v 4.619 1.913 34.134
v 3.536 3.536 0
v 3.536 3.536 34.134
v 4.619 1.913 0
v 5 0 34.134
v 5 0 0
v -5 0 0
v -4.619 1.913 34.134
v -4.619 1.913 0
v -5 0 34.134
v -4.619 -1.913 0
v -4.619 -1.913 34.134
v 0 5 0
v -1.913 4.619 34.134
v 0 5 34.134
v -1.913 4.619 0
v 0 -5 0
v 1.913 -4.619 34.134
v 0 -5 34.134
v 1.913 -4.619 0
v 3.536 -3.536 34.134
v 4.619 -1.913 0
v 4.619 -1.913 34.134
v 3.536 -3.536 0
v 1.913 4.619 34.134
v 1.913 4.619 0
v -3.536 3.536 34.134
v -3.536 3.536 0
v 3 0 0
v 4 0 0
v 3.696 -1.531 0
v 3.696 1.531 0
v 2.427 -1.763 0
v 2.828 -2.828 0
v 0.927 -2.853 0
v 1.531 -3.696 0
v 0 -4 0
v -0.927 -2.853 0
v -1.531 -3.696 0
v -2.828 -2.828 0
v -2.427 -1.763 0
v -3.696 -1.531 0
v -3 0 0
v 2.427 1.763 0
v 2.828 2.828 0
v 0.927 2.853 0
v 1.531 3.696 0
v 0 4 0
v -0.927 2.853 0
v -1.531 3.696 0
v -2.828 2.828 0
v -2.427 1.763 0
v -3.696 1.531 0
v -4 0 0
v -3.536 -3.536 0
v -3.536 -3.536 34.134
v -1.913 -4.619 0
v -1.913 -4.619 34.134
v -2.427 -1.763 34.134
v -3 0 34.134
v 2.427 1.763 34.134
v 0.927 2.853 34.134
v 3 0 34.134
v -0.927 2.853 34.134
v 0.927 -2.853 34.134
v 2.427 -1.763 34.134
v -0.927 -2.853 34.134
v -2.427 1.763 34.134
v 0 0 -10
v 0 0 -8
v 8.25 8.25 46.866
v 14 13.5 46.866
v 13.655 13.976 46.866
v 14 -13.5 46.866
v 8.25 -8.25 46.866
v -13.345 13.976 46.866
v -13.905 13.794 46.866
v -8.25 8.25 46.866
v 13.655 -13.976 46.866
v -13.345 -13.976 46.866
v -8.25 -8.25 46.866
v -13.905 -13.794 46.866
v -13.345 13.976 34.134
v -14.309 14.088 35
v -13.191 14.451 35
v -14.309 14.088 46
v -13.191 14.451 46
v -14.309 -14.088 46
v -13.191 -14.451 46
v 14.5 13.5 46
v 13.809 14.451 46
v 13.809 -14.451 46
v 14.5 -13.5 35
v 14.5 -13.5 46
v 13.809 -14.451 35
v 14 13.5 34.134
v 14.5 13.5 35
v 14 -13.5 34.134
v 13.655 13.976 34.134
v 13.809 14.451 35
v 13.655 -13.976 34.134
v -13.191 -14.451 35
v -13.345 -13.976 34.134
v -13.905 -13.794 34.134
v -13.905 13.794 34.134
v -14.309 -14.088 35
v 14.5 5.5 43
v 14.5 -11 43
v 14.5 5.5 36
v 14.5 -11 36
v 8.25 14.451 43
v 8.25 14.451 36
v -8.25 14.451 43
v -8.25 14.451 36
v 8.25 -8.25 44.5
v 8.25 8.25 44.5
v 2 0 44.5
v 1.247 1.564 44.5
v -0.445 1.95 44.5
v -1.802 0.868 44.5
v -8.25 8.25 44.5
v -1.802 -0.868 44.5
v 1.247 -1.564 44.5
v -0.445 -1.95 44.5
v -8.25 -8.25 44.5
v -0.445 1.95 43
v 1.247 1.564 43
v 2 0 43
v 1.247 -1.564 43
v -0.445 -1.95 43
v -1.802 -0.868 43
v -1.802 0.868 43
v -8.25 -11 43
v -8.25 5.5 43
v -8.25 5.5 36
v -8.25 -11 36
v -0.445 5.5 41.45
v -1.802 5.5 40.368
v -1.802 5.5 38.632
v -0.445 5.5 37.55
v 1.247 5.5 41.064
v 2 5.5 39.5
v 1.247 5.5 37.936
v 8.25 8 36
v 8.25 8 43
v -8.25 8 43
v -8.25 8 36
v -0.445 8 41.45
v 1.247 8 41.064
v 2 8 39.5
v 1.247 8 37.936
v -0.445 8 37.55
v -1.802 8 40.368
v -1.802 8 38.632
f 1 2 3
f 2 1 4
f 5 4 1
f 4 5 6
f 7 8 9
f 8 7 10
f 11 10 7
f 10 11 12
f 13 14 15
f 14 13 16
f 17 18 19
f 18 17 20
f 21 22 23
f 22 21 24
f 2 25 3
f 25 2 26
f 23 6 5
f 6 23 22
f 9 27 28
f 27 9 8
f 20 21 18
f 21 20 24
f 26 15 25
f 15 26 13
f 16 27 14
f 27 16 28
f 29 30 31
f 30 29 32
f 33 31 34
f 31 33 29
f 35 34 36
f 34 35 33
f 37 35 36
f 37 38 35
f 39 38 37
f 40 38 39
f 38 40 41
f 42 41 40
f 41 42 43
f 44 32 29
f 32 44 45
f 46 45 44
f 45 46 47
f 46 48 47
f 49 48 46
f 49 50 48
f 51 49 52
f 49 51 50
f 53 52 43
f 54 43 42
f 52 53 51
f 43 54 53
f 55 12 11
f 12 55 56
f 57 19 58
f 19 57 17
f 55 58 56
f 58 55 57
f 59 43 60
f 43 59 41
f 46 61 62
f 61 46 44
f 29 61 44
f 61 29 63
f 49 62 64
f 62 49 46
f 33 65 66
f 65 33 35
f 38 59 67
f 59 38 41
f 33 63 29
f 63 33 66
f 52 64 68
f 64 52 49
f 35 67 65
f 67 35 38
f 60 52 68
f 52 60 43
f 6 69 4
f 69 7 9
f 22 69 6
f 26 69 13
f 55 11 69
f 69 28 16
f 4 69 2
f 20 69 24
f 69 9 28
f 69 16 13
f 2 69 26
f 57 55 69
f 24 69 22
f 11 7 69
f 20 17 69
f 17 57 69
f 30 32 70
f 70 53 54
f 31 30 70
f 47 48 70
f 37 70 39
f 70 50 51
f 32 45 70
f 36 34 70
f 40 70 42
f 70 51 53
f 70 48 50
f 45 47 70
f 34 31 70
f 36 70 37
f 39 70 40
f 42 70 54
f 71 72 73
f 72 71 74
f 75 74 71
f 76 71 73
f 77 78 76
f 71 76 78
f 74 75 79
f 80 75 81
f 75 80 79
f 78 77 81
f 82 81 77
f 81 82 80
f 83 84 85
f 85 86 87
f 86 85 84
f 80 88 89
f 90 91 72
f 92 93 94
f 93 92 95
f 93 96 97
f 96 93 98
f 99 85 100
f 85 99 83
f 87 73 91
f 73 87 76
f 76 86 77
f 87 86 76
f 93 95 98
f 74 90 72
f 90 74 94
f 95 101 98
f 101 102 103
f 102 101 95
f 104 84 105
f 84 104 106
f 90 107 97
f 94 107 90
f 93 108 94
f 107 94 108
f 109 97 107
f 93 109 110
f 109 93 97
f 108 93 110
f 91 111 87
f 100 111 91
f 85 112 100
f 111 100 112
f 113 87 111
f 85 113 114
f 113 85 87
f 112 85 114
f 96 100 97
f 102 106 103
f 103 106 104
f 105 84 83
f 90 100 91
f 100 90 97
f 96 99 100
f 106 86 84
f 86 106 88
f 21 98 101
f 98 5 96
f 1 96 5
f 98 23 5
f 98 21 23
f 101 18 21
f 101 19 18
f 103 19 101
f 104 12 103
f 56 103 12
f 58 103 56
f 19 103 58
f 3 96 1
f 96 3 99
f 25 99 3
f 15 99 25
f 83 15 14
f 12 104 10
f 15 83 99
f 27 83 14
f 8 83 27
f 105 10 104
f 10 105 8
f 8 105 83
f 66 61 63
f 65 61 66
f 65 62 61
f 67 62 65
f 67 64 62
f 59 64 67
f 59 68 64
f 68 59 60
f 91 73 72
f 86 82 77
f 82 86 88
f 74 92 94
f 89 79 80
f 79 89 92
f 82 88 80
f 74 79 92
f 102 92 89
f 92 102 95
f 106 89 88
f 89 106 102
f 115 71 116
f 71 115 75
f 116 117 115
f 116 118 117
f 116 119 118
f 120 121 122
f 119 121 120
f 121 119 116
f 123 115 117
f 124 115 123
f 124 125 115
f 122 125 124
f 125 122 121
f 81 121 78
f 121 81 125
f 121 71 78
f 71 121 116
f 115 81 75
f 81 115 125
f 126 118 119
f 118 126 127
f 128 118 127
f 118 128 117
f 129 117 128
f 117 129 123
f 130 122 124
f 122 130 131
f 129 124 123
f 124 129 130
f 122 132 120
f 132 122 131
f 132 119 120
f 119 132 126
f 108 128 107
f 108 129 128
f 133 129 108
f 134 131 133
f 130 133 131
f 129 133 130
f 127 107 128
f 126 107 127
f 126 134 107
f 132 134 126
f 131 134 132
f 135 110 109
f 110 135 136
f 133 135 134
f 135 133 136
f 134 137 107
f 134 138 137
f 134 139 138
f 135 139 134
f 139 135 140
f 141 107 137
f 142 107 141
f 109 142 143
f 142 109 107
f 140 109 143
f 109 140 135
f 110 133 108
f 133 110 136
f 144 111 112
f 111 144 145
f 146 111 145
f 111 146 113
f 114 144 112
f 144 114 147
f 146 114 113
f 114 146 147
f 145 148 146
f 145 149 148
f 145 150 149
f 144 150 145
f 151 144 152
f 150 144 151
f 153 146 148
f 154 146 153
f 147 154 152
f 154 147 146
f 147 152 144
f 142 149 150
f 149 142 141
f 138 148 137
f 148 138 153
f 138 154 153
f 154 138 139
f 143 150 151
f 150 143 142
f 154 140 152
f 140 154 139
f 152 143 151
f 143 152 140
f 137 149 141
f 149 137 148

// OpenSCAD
difference() {
    cylinder(h=35, r=5);
    translate([0,0,-2])cylinder(h=40, r=3);
}

difference() {
 translate([0,0,-10]) cylinder(h=10, r1=0 , r2=5);
 translate([0,0,-8]) cylinder(h=10, r1=0 , r2=5);
}

difference() {
    minkowski() {
        translate([0, 0, 40.5]) cube([27, 27, 11], center = true);
        sphere(r=1);                      
    }
    translate([0, 0, 46]) cube([16.5, 16.5, 3], center = true);
    translate([0, 0, 43]) cylinder(h=4, r=2, center = true);
    translate([-8.25, -11, 36]) cube([25, 16.5, 7], center = false);
    translate([-8.25, 8, 36]) cube([16.5, 8.5, 7], center = false);
    rotate([90, 0, 0]) translate([0, 39.5, -9]) cylinder(h=4, r=2); 
}
 
